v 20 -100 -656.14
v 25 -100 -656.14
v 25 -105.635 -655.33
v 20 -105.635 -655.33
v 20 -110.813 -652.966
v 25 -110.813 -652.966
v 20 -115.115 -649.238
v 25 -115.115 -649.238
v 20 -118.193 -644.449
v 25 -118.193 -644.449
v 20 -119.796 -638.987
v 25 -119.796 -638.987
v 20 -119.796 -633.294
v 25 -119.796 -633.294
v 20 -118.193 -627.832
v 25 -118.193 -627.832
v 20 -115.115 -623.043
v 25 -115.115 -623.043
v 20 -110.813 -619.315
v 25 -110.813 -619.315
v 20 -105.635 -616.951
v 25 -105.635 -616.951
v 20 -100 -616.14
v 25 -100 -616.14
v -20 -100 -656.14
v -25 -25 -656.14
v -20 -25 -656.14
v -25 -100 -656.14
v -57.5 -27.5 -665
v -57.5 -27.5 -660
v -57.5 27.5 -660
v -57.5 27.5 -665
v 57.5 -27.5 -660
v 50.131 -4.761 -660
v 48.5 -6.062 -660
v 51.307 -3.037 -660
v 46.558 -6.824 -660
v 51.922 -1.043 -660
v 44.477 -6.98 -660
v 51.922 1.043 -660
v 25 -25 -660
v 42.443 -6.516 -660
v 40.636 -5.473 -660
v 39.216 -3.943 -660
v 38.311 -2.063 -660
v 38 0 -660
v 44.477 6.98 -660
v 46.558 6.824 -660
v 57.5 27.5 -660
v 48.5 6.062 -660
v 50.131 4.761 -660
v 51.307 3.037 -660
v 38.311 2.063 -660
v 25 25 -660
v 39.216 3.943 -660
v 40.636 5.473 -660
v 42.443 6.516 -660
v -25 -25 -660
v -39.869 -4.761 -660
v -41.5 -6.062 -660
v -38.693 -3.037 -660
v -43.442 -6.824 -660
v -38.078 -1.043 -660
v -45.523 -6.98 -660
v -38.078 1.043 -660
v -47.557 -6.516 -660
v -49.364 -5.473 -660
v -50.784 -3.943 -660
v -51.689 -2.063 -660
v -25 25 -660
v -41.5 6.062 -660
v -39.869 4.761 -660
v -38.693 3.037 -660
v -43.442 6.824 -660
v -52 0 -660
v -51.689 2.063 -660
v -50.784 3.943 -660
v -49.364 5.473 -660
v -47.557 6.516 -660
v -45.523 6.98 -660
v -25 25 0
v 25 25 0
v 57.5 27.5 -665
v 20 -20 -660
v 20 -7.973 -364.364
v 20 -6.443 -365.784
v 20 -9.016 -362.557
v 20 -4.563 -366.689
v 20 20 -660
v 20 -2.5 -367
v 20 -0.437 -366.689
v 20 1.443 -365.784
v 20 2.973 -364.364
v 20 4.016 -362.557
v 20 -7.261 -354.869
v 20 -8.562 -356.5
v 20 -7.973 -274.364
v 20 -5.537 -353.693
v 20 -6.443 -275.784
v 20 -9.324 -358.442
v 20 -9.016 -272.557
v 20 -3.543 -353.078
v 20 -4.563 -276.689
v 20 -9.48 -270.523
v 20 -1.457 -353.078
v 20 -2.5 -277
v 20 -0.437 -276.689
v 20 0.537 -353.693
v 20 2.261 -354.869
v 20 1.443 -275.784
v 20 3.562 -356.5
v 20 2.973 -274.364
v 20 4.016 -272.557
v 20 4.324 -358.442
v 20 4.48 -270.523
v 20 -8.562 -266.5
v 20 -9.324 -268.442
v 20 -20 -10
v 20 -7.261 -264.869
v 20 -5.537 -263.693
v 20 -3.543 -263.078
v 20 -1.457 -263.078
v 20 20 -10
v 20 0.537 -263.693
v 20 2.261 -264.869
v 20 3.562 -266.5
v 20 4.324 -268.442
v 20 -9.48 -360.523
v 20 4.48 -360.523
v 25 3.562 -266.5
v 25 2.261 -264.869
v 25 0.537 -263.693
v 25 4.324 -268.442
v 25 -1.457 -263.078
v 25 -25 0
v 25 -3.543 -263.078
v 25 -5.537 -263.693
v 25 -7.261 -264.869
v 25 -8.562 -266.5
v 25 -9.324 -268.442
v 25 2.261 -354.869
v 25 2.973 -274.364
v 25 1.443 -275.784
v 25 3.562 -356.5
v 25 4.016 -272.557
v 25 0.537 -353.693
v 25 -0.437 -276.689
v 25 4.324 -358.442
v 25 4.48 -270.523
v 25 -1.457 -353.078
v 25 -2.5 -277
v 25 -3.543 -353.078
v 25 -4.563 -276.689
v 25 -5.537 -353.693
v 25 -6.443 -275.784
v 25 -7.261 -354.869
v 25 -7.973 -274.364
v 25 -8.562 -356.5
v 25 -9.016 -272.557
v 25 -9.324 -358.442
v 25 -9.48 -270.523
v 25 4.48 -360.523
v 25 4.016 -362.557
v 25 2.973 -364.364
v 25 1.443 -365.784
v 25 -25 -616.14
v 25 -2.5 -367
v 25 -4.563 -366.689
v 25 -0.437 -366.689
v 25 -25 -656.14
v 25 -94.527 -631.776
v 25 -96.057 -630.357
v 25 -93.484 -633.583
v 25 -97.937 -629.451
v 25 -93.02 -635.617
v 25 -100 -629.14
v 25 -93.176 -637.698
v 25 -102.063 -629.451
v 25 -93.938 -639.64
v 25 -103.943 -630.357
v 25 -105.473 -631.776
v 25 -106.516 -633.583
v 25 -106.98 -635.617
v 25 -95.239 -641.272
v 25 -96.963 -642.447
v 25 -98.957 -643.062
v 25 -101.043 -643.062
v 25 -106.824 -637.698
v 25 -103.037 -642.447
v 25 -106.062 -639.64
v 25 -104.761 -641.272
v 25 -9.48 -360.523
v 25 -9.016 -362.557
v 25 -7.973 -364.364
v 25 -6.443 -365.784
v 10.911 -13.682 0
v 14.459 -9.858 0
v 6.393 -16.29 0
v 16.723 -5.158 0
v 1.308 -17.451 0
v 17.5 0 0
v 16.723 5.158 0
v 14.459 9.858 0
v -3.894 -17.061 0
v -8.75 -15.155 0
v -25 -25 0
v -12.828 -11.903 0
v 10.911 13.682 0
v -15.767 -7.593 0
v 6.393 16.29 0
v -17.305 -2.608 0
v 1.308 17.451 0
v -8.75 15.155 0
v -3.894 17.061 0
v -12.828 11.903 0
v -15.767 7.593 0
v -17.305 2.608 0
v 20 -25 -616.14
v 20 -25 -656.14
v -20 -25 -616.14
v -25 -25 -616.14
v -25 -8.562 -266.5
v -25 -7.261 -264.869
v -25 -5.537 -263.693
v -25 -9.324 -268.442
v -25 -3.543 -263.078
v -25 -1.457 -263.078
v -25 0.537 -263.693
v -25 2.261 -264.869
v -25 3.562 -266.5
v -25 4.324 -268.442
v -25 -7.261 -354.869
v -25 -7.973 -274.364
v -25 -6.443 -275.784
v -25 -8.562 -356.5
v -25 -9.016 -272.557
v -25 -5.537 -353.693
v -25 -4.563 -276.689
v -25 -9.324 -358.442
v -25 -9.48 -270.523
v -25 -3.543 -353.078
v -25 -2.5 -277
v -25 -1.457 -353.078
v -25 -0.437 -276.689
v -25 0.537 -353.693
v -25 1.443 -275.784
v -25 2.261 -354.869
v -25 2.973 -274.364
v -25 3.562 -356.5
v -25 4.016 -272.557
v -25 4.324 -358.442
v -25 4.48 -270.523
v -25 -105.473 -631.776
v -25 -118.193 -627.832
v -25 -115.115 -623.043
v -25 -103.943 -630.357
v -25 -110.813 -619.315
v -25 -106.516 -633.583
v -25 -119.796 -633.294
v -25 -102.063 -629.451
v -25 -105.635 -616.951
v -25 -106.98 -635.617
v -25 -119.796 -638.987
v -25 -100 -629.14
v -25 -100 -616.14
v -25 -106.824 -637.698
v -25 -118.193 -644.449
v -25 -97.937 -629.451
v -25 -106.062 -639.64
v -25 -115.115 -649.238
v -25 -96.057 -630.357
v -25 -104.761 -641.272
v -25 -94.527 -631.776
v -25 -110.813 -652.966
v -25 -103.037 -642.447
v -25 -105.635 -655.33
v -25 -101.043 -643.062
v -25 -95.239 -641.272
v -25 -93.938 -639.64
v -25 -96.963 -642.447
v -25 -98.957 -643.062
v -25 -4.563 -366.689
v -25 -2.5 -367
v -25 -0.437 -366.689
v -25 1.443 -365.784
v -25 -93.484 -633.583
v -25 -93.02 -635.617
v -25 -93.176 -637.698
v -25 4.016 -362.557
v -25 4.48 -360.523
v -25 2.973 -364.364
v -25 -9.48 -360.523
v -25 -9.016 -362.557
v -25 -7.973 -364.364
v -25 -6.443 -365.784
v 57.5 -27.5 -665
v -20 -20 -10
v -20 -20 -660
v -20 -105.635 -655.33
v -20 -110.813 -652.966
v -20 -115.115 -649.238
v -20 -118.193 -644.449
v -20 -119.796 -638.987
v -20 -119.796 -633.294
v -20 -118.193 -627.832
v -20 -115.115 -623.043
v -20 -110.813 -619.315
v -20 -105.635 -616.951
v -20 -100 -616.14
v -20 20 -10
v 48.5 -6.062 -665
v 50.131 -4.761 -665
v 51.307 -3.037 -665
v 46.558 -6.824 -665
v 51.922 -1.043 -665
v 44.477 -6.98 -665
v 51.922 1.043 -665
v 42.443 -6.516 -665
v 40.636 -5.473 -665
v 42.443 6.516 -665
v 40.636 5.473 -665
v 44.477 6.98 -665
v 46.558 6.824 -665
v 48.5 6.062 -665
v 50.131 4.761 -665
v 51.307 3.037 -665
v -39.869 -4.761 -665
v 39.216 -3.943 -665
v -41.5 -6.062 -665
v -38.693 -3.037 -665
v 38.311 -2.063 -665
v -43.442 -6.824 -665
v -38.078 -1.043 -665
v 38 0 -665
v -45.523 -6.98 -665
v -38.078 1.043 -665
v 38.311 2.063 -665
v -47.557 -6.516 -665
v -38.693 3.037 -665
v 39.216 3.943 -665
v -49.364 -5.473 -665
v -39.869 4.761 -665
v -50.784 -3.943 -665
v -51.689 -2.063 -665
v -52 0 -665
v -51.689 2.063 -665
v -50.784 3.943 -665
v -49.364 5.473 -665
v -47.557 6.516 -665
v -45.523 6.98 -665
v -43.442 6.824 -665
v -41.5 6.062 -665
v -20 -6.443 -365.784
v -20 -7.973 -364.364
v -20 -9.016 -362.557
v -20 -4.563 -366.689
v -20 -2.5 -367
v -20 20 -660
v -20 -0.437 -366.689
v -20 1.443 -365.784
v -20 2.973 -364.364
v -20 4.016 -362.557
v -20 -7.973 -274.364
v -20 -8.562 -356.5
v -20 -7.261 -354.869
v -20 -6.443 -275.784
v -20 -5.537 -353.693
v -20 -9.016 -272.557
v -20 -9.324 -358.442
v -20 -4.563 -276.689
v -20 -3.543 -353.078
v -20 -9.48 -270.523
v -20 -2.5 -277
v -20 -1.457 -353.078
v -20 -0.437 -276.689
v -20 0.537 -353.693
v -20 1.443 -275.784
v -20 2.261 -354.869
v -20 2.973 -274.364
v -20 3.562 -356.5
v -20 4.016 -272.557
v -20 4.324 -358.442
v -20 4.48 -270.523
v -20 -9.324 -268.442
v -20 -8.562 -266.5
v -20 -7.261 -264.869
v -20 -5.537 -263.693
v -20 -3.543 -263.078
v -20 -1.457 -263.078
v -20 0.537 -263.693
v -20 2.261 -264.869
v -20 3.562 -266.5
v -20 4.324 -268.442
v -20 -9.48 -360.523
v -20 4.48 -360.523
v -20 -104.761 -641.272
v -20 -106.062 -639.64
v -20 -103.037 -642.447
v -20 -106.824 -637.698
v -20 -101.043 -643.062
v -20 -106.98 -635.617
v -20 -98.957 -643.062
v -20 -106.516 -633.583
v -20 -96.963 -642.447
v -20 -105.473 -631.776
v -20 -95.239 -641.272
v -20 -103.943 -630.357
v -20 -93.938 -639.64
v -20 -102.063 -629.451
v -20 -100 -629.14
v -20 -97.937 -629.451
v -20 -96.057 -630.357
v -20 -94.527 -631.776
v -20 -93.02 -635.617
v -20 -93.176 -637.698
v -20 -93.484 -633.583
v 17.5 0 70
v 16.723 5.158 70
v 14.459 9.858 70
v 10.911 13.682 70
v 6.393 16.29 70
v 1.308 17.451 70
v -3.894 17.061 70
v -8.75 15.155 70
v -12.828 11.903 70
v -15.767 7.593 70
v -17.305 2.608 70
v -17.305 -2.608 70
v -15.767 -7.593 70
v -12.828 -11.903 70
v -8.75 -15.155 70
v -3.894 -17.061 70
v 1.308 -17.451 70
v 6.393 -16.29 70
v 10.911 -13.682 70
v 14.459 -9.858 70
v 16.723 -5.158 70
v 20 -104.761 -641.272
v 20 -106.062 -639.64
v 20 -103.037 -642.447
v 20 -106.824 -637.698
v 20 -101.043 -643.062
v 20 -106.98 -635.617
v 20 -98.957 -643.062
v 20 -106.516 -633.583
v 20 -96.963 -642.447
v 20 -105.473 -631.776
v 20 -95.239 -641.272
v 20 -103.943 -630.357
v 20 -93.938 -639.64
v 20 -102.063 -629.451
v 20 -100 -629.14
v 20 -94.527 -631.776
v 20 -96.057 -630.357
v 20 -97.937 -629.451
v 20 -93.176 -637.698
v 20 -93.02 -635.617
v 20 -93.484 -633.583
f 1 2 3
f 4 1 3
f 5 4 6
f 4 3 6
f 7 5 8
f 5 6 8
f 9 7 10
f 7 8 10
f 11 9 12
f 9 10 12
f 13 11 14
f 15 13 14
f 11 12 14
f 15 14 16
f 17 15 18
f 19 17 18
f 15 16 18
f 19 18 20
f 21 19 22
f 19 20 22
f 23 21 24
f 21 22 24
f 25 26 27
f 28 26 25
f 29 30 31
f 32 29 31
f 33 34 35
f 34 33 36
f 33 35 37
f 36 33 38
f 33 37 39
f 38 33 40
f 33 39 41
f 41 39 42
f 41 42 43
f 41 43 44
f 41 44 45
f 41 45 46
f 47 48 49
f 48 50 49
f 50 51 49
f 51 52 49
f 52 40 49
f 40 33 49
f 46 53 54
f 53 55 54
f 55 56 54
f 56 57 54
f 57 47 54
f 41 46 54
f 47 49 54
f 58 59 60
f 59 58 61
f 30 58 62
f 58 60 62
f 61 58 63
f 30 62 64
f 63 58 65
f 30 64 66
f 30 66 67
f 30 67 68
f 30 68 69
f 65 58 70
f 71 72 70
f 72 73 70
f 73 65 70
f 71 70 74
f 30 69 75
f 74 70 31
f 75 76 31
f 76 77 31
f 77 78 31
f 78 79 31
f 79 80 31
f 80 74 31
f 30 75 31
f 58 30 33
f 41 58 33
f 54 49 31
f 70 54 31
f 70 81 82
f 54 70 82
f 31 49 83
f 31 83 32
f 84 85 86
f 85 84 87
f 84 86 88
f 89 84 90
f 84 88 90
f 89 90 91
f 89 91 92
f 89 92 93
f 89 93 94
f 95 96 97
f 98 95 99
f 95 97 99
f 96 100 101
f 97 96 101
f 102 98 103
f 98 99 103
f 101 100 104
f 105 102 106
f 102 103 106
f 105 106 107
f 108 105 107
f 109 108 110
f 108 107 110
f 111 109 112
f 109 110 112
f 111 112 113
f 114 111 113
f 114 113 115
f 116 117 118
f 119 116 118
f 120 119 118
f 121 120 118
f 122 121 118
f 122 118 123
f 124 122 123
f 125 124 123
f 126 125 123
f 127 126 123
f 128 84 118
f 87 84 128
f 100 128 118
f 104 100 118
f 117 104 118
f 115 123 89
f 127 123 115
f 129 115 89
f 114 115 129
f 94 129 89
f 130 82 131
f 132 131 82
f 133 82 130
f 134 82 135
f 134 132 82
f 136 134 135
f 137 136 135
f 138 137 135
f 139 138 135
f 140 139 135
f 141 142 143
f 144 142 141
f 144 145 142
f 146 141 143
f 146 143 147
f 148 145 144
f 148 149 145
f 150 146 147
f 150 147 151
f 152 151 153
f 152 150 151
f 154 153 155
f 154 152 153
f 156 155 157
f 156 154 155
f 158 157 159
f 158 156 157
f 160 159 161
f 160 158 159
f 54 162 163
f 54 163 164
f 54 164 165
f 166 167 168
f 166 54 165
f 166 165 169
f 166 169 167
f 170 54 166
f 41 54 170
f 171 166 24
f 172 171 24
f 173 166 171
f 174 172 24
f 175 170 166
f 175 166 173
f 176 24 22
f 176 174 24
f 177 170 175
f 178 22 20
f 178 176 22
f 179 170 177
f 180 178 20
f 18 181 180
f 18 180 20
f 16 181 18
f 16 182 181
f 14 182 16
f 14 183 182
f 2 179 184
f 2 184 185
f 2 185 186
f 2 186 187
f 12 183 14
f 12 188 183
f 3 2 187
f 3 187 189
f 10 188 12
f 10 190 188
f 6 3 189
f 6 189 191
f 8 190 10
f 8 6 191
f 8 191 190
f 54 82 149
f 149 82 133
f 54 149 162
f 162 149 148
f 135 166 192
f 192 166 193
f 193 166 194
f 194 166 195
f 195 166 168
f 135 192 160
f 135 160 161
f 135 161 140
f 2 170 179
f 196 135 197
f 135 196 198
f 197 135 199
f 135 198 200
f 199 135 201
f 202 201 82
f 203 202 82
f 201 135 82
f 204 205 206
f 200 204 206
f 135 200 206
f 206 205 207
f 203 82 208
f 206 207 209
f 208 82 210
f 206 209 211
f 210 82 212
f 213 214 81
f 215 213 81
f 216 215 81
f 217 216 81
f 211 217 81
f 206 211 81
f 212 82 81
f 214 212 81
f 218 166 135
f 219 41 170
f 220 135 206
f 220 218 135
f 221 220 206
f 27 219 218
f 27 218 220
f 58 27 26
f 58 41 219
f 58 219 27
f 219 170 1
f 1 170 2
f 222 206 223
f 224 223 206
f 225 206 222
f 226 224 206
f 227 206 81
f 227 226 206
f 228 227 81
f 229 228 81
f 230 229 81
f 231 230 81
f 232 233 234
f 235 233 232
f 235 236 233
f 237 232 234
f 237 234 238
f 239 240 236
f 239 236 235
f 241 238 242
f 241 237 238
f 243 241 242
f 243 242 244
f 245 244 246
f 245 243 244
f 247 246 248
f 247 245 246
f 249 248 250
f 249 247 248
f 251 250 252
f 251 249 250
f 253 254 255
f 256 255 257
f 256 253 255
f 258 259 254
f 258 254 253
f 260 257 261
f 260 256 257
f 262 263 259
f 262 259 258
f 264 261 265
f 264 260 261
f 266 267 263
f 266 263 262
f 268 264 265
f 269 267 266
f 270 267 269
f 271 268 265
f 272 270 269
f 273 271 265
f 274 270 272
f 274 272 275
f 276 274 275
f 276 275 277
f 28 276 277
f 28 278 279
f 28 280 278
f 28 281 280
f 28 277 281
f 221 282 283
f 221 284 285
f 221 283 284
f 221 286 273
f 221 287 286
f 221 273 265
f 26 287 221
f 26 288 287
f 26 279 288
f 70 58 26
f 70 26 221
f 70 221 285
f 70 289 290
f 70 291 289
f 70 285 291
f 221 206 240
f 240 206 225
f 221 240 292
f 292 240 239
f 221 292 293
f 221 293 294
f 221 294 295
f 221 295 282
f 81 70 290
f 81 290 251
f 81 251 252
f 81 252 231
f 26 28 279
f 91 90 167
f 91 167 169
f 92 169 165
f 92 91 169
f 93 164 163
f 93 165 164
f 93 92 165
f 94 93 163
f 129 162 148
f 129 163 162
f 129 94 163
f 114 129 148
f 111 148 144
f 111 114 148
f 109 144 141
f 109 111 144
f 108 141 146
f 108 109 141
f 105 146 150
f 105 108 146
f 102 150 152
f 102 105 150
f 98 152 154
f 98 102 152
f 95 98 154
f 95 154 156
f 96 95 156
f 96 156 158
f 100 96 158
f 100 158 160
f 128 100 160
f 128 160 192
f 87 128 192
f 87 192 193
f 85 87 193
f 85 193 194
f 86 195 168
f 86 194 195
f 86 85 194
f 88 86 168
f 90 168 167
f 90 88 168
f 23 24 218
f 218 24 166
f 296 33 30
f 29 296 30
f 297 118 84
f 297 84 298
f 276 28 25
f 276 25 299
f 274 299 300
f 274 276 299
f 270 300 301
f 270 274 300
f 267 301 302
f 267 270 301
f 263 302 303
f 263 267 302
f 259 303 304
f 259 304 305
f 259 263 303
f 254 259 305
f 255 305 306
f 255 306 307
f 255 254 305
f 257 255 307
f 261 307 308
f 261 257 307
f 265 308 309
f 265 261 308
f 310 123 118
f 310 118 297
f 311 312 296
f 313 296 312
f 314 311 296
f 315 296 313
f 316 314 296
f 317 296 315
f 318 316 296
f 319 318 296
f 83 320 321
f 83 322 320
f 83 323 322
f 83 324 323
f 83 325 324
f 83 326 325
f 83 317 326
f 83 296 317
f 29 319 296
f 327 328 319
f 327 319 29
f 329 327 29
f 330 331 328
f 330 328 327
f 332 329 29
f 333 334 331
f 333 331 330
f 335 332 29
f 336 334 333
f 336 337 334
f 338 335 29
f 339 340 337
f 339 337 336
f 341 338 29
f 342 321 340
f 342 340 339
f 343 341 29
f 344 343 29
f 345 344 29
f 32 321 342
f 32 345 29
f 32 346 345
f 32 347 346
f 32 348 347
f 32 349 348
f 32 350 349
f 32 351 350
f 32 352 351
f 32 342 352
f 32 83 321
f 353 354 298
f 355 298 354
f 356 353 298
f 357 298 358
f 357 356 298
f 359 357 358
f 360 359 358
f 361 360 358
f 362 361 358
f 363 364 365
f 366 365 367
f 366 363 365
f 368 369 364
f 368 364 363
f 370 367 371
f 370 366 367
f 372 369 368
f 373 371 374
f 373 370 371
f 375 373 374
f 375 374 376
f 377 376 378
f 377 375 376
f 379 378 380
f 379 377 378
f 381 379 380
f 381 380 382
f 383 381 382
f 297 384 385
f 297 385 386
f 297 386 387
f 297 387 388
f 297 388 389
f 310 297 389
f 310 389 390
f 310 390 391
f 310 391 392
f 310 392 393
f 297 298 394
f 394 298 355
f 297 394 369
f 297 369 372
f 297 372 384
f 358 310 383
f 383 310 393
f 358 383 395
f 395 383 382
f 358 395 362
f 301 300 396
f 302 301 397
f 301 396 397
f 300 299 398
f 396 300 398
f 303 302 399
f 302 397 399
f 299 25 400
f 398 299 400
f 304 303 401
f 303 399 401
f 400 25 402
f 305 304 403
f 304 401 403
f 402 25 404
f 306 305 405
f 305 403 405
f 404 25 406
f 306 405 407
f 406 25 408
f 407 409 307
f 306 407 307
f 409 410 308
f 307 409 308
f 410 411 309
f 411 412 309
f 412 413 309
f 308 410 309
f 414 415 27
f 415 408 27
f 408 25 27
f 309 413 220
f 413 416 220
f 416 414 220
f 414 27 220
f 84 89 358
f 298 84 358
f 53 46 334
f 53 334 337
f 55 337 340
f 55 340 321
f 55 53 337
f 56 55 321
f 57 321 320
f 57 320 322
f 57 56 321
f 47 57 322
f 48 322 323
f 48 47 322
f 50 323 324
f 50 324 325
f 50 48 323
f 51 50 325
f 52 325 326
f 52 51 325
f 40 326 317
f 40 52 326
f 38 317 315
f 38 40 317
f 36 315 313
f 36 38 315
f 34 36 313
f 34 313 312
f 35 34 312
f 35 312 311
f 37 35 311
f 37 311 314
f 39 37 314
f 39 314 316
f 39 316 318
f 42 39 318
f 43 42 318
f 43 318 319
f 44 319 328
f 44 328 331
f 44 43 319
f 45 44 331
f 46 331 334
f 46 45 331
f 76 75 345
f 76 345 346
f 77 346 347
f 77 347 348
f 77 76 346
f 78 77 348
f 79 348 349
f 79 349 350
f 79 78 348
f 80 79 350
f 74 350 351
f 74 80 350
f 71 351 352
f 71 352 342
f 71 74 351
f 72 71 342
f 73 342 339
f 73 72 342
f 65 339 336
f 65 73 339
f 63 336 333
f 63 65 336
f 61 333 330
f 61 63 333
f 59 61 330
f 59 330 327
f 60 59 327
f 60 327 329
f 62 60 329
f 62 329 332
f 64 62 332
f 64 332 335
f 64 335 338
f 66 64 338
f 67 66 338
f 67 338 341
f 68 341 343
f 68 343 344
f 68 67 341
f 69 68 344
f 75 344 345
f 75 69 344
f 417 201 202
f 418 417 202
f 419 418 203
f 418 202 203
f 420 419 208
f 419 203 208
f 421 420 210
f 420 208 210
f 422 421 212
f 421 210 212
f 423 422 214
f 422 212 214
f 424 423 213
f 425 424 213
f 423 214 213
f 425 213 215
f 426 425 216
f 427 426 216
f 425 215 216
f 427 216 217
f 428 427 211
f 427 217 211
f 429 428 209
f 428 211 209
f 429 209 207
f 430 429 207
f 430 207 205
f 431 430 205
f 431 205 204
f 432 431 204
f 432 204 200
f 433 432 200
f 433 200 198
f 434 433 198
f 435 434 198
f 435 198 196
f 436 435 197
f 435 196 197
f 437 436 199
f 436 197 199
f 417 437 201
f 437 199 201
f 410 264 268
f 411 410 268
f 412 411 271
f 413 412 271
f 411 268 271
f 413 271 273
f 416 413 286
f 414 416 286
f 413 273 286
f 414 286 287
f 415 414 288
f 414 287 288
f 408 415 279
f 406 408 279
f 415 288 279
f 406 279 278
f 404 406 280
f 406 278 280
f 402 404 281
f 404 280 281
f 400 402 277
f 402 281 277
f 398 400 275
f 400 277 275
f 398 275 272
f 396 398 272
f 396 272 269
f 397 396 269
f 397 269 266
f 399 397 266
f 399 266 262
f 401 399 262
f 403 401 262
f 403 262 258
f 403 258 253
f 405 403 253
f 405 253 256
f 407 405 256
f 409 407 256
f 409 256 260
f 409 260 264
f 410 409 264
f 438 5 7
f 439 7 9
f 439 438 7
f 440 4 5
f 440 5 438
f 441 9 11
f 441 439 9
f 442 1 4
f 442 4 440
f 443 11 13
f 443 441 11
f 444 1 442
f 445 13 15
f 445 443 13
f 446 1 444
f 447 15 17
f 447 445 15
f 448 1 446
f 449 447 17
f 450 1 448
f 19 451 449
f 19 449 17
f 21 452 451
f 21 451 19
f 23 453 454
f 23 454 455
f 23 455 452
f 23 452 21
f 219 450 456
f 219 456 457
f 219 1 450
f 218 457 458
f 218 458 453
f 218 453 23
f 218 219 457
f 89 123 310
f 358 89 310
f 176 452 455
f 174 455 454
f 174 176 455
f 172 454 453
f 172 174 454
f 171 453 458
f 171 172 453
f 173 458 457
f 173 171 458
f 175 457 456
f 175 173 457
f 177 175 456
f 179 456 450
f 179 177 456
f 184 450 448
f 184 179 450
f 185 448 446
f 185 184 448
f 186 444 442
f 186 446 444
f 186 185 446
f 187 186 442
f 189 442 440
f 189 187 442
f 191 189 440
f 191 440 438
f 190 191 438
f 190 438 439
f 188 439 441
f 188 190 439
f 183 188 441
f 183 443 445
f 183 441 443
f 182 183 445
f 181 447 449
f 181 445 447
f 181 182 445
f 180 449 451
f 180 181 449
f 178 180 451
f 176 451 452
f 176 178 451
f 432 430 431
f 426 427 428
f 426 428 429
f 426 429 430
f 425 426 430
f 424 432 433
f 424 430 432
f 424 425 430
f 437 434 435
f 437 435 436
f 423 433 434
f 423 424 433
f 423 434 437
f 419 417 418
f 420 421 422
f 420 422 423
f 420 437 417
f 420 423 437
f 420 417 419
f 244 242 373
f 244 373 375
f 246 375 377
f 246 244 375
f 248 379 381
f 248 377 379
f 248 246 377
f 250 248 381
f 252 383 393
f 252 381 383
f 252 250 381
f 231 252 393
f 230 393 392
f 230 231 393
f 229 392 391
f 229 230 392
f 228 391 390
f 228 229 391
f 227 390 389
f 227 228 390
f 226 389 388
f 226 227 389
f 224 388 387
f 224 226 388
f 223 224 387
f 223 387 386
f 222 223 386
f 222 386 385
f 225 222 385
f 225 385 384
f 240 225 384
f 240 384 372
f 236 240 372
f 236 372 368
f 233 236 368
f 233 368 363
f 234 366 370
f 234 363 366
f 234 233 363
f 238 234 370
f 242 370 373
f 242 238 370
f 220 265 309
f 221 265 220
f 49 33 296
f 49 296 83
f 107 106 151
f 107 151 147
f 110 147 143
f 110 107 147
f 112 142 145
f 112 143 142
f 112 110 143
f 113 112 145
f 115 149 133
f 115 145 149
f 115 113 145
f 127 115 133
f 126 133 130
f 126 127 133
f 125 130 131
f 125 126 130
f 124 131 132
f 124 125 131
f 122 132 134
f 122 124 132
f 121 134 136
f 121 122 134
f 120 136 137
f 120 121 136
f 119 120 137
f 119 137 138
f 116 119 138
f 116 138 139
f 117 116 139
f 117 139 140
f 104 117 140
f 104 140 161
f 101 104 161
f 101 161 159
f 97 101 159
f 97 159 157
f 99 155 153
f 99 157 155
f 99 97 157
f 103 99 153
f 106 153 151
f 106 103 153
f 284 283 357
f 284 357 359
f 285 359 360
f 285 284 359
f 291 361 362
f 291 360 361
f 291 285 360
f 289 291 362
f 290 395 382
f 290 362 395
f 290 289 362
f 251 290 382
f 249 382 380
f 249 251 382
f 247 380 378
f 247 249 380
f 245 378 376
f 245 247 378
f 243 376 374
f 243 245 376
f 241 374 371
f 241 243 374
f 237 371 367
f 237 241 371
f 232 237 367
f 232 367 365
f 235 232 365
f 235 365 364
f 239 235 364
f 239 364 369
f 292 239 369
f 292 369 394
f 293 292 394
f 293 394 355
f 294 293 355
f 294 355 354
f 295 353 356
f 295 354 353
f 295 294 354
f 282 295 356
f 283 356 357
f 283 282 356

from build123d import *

# Parameters (mm, degrees)
SKETCH1_R               = 17.5
BOSS_EXTRUDE1_DEPTH     = 70
SKETCH4_W               = 50
SKETCH4_H               = 50
CUT_EXTRUDE1_DEPTH      = 731.855662905
CUT_EXTRUDE1_DEPTH_BACK = 650
SKETCH5_W               = 40
SKETCH5_H               = 40
SKETCH6_W               = 115
SKETCH6_H               = 55
SKETCH6_R               = 7
BOSS_EXTRUDE2_DEPTH     = 5
BOSS_EXTRUDE4_DEPTH     = 5
SKETCH13_R              = 7
CUT_EXTRUDE4_DEPTH      = 681.757849753
CUT_EXTRUDE5_DEPTH      = 681.757849753
CUT_EXTRUDE5_DEPTH_BACK = 681.757849753
SKETCH14_R              = 7


with BuildPart() as part:
    # Sketch1 → Boss-Extrude1 (new body)
    with BuildSketch(Plane.XY):
        Circle(SKETCH1_R)
    extrude(amount=BOSS_EXTRUDE1_DEPTH)

    # Sweep1: sweep along a path in Sketch3
    with BuildLine(Plane(origin=(0, 0, 0), x_dir=(1, 0, 0), z_dir=(0, 1, 0))) as sweep1_path:
        Line((0, 0), (0, 660))
    # Sketch4 → Sweep1 (sweep)
    with BuildSketch(Plane(origin=(0, 0, 0), x_dir=(-1, 0, 0), z_dir=(0, 0, -1))):
        Rectangle(SKETCH4_W, SKETCH4_H)
    sweep(path=sweep1_path.line)

    # Sketch5 → Cut-Extrude1 (cut, two sides: drawn at the far end of the back side and taken through both)
    with BuildSketch(Plane(origin=(0, 0, -660), x_dir=(-1, 0, 0), z_dir=(0, 0, -1)).offset(-CUT_EXTRUDE1_DEPTH_BACK)):
        Rectangle(SKETCH5_W, SKETCH5_H)
    extrude(amount=CUT_EXTRUDE1_DEPTH + CUT_EXTRUDE1_DEPTH_BACK, mode=Mode.SUBTRACT)

    # Sketch6 → Boss-Extrude2 (add)
    with BuildSketch(Plane(origin=(0, 0, -660), x_dir=(-1, 0, 0), z_dir=(0, 0, -1))):
        Rectangle(SKETCH6_W, SKETCH6_H)
        with Locations((-45, 0)):
            Circle(SKETCH6_R, mode=Mode.SUBTRACT)
        with Locations((45, 0)):
            Circle(SKETCH6_R, mode=Mode.SUBTRACT)
    extrude(amount=BOSS_EXTRUDE2_DEPTH)

    # Sketch12 → Boss-Extrude4 (add)
    with BuildSketch(Plane.ZY.offset(25)):
        with BuildLine():
            Line((-616.140431975, -25), (-656.140431975, -25))
            Line((-656.140431975, -25), (-656.140431975, -100))
            ThreePointArc((-656.140431975, -100), (-636.140431975, -120), (-616.140431975, -100))
            Line((-616.140431975, -100), (-616.140431975, -25))
        make_face()
    boss_extrude4 = extrude(amount=-BOSS_EXTRUDE4_DEPTH)

    # Sketch13 → Cut-Extrude4 (cut, through all)
    with BuildSketch(Plane.ZY.offset(25)):
        with Locations((-636.140431975, -100)):
            Circle(SKETCH13_R)
    cut_extrude4 = extrude(amount=-CUT_EXTRUDE4_DEPTH, mode=Mode.SUBTRACT)

    # Mirror1: Boss-Extrude4 across plane
    add(boss_extrude4.mirror(Plane(origin=(0, 0, 0), x_dir=(0, 0, 1), z_dir=(1, 0, 0))))

    # Mirror2: Cut-Extrude4 across plane
    add(cut_extrude4.mirror(Plane(origin=(0, 0, 0), x_dir=(0, 0, 1), z_dir=(1, 0, 0))), mode=Mode.SUBTRACT)

    # Sketch14 → Cut-Extrude5 (cut, two sides: drawn at the far end of the back side and taken through both)
    with BuildSketch(Plane(origin=(25, 0, 0), x_dir=(0, 0, -1), z_dir=(1, 0, 0)).offset(-CUT_EXTRUDE5_DEPTH_BACK)):
        with Locations((270, -2.5)):
            Circle(SKETCH14_R)
        with Locations((360, -2.5)):
            Circle(SKETCH14_R)
    extrude(amount=CUT_EXTRUDE5_DEPTH + CUT_EXTRUDE5_DEPTH_BACK, mode=Mode.SUBTRACT)


solid = part.part
